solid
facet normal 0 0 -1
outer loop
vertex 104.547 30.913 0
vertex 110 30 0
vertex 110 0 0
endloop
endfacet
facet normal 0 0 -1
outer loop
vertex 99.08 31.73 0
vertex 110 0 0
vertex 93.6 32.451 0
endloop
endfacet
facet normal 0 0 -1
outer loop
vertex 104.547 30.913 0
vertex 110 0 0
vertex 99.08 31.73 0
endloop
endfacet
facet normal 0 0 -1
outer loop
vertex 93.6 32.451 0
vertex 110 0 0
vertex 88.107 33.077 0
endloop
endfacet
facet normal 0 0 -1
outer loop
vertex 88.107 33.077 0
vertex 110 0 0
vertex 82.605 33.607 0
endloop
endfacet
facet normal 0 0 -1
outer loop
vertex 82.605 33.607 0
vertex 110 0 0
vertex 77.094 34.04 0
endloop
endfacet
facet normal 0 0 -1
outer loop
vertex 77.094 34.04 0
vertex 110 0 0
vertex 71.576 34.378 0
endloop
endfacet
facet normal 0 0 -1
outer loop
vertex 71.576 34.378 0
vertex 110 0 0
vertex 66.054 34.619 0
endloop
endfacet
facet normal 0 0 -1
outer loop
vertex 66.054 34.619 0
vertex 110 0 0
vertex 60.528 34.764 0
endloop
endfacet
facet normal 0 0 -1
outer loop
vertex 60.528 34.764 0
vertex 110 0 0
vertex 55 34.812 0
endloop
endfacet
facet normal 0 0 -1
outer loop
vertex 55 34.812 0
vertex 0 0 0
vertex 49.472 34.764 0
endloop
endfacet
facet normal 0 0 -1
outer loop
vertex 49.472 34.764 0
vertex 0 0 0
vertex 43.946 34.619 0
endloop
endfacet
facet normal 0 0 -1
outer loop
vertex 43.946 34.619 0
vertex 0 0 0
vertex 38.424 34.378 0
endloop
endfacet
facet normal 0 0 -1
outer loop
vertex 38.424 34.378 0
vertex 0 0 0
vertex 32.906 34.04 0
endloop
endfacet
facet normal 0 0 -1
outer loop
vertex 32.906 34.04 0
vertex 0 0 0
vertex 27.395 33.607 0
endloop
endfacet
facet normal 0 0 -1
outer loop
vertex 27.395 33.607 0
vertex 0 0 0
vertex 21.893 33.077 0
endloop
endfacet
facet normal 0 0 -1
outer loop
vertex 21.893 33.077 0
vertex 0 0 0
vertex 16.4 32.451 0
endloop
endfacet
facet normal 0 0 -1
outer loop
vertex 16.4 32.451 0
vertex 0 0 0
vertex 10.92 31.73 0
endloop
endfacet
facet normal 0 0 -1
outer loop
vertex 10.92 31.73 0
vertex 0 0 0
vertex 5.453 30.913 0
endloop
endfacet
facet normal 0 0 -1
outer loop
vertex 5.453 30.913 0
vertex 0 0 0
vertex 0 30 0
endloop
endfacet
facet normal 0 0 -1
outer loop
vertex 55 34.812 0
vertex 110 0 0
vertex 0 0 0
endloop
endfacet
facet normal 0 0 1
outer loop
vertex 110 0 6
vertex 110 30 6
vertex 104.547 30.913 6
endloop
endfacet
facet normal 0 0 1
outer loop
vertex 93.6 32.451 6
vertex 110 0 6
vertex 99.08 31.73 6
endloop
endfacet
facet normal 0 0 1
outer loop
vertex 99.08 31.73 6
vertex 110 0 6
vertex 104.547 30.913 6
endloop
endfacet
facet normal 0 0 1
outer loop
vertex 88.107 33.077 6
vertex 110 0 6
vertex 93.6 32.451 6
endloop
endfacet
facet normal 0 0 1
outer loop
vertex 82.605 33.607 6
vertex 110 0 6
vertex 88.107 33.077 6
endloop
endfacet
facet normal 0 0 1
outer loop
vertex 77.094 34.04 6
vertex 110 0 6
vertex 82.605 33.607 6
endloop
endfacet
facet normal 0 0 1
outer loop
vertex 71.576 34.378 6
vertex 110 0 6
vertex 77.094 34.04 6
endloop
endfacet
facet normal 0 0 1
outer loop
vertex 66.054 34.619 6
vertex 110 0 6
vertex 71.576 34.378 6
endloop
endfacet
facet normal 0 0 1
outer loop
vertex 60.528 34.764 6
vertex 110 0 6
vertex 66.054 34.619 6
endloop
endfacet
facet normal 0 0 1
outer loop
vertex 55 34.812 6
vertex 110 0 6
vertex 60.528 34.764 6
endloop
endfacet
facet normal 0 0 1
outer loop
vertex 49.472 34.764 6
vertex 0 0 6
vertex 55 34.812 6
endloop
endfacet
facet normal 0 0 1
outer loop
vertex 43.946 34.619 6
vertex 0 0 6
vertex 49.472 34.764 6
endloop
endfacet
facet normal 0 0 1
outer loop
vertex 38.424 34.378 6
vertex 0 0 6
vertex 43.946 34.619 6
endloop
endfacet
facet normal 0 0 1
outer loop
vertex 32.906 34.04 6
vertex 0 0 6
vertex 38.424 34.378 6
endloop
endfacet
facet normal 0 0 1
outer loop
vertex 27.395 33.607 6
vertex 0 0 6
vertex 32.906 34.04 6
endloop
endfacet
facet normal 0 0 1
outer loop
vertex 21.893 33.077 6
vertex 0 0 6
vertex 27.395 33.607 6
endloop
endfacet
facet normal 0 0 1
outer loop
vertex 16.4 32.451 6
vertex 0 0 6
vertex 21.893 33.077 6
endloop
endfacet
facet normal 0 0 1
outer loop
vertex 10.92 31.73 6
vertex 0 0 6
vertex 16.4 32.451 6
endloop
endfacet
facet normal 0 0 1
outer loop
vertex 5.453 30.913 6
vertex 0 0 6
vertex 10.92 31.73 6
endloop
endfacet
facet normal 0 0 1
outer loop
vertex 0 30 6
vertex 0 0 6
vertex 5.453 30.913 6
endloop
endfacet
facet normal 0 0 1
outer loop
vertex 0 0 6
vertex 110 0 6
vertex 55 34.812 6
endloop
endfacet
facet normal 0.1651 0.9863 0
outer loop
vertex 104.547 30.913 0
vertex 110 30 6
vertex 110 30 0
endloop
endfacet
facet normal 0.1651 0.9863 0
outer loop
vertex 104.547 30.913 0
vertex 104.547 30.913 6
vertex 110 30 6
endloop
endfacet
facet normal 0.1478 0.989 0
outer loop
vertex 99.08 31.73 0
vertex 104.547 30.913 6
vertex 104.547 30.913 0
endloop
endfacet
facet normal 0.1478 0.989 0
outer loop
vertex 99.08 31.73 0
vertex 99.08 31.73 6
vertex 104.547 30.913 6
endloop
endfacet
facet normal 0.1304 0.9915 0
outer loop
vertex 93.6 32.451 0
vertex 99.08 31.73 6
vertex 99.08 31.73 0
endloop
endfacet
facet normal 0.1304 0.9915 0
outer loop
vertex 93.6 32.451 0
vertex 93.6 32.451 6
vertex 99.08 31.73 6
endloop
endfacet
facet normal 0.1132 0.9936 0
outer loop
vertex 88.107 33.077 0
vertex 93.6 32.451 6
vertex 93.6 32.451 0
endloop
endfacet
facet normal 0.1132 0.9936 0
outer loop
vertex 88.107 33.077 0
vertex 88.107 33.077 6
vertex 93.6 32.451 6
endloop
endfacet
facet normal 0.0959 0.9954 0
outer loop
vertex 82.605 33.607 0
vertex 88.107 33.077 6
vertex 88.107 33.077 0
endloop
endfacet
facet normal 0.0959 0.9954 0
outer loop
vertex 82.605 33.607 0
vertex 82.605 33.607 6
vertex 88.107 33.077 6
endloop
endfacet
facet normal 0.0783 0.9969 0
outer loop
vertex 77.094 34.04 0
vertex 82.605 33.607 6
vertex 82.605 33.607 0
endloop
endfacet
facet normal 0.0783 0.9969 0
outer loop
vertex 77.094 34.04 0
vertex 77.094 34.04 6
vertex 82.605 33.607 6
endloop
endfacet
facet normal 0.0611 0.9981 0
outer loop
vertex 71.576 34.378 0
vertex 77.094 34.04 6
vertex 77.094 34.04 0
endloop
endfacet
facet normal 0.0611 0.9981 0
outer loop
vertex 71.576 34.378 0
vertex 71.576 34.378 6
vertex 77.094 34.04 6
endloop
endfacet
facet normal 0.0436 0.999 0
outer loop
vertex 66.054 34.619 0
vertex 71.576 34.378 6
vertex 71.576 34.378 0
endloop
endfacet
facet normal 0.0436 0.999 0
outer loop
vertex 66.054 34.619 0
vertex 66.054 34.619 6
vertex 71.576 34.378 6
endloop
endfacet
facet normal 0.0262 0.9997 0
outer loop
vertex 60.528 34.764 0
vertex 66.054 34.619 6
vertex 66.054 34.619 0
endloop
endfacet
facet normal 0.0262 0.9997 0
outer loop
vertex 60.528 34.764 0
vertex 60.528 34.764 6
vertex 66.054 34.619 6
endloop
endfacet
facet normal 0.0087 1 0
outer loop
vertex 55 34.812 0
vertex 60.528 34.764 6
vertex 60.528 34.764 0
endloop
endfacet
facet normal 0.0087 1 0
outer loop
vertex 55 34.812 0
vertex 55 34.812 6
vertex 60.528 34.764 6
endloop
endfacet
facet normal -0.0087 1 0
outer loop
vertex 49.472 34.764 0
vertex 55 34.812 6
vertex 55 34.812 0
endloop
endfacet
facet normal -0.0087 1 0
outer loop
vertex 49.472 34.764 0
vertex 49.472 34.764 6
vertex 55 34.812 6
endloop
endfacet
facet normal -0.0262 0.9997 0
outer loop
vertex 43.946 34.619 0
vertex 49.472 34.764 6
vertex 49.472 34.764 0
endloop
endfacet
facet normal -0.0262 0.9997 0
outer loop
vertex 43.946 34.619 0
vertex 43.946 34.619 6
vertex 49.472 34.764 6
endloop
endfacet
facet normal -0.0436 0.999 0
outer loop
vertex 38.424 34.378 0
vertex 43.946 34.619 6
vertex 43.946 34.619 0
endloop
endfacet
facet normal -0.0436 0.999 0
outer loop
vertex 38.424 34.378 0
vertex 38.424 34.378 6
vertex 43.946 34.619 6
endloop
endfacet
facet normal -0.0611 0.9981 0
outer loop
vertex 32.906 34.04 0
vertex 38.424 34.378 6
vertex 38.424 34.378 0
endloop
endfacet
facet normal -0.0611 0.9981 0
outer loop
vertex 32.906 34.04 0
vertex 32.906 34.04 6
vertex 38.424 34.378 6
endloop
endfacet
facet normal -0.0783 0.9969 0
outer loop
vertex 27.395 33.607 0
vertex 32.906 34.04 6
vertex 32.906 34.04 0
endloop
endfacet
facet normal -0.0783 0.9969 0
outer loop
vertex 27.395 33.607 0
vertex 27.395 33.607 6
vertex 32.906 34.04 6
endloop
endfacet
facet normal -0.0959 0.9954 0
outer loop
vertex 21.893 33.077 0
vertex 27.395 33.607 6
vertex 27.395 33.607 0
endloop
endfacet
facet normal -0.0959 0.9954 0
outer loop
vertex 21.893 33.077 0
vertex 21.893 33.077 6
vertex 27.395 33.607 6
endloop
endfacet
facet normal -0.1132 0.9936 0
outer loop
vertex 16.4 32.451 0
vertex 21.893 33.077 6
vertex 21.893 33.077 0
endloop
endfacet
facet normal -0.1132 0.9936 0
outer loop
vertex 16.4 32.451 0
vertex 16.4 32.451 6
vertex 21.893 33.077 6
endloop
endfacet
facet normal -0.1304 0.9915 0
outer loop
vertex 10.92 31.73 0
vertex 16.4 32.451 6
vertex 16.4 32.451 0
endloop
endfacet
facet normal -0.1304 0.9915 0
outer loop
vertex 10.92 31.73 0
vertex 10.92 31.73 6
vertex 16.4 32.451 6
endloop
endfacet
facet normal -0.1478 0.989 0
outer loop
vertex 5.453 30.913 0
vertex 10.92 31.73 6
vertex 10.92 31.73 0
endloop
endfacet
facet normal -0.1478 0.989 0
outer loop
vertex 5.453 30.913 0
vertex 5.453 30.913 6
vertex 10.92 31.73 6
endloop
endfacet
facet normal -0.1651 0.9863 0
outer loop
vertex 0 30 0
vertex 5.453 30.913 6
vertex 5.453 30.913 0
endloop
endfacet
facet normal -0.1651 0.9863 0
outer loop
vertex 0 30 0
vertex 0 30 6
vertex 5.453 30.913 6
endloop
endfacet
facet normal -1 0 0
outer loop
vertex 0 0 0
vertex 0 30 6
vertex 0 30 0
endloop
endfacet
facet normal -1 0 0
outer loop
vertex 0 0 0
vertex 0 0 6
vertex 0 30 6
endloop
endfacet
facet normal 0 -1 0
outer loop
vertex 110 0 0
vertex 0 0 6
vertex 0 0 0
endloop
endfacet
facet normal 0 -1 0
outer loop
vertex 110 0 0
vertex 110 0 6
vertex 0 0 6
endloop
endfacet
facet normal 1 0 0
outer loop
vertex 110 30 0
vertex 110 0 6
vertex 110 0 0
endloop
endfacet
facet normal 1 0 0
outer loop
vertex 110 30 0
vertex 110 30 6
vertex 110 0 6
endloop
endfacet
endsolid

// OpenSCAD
$fn = 32;

// ----------------------------------------------------------------------
// Arc profile plate: crown, 23 points
// ----------------------------------------------------------------------

// --- parameters (mm) ---
bar_l = 110;              // bar length, X
bar_w = 30;               // bar height at the ends, Y
arc_r = 316.73;           // radius of the crown arc
arc_angle = 20;           // crown arc angle, degrees
crown_rise = 4.81;        // rise of the crown over the ends
arc_step = 1;             // sampling step of the crown arc, degrees
plate_t = 6;              // plate thickness, Z

bbox_y = bar_w + crown_rise;  // full height with the crown

profile = [[110, 30], [104.547, 30.913], [99.08, 31.73], [93.6, 32.451], [88.107, 33.077], [82.605, 33.607], [77.094, 34.04], [71.576, 34.378], [66.054, 34.619], [60.528, 34.764], [55, 34.812], [49.472, 34.764], [43.946, 34.619], [38.424, 34.378], [32.906, 34.04], [27.395, 33.607], [21.893, 33.077], [16.4, 32.451], [10.92, 31.73], [5.453, 30.913], [0, 30], [0, 0], [110, 0]];  // primary outline, 23 points, counter clockwise

// --- the one profile operation ---
linear_extrude(height = plate_t) polygon(points = profile);
